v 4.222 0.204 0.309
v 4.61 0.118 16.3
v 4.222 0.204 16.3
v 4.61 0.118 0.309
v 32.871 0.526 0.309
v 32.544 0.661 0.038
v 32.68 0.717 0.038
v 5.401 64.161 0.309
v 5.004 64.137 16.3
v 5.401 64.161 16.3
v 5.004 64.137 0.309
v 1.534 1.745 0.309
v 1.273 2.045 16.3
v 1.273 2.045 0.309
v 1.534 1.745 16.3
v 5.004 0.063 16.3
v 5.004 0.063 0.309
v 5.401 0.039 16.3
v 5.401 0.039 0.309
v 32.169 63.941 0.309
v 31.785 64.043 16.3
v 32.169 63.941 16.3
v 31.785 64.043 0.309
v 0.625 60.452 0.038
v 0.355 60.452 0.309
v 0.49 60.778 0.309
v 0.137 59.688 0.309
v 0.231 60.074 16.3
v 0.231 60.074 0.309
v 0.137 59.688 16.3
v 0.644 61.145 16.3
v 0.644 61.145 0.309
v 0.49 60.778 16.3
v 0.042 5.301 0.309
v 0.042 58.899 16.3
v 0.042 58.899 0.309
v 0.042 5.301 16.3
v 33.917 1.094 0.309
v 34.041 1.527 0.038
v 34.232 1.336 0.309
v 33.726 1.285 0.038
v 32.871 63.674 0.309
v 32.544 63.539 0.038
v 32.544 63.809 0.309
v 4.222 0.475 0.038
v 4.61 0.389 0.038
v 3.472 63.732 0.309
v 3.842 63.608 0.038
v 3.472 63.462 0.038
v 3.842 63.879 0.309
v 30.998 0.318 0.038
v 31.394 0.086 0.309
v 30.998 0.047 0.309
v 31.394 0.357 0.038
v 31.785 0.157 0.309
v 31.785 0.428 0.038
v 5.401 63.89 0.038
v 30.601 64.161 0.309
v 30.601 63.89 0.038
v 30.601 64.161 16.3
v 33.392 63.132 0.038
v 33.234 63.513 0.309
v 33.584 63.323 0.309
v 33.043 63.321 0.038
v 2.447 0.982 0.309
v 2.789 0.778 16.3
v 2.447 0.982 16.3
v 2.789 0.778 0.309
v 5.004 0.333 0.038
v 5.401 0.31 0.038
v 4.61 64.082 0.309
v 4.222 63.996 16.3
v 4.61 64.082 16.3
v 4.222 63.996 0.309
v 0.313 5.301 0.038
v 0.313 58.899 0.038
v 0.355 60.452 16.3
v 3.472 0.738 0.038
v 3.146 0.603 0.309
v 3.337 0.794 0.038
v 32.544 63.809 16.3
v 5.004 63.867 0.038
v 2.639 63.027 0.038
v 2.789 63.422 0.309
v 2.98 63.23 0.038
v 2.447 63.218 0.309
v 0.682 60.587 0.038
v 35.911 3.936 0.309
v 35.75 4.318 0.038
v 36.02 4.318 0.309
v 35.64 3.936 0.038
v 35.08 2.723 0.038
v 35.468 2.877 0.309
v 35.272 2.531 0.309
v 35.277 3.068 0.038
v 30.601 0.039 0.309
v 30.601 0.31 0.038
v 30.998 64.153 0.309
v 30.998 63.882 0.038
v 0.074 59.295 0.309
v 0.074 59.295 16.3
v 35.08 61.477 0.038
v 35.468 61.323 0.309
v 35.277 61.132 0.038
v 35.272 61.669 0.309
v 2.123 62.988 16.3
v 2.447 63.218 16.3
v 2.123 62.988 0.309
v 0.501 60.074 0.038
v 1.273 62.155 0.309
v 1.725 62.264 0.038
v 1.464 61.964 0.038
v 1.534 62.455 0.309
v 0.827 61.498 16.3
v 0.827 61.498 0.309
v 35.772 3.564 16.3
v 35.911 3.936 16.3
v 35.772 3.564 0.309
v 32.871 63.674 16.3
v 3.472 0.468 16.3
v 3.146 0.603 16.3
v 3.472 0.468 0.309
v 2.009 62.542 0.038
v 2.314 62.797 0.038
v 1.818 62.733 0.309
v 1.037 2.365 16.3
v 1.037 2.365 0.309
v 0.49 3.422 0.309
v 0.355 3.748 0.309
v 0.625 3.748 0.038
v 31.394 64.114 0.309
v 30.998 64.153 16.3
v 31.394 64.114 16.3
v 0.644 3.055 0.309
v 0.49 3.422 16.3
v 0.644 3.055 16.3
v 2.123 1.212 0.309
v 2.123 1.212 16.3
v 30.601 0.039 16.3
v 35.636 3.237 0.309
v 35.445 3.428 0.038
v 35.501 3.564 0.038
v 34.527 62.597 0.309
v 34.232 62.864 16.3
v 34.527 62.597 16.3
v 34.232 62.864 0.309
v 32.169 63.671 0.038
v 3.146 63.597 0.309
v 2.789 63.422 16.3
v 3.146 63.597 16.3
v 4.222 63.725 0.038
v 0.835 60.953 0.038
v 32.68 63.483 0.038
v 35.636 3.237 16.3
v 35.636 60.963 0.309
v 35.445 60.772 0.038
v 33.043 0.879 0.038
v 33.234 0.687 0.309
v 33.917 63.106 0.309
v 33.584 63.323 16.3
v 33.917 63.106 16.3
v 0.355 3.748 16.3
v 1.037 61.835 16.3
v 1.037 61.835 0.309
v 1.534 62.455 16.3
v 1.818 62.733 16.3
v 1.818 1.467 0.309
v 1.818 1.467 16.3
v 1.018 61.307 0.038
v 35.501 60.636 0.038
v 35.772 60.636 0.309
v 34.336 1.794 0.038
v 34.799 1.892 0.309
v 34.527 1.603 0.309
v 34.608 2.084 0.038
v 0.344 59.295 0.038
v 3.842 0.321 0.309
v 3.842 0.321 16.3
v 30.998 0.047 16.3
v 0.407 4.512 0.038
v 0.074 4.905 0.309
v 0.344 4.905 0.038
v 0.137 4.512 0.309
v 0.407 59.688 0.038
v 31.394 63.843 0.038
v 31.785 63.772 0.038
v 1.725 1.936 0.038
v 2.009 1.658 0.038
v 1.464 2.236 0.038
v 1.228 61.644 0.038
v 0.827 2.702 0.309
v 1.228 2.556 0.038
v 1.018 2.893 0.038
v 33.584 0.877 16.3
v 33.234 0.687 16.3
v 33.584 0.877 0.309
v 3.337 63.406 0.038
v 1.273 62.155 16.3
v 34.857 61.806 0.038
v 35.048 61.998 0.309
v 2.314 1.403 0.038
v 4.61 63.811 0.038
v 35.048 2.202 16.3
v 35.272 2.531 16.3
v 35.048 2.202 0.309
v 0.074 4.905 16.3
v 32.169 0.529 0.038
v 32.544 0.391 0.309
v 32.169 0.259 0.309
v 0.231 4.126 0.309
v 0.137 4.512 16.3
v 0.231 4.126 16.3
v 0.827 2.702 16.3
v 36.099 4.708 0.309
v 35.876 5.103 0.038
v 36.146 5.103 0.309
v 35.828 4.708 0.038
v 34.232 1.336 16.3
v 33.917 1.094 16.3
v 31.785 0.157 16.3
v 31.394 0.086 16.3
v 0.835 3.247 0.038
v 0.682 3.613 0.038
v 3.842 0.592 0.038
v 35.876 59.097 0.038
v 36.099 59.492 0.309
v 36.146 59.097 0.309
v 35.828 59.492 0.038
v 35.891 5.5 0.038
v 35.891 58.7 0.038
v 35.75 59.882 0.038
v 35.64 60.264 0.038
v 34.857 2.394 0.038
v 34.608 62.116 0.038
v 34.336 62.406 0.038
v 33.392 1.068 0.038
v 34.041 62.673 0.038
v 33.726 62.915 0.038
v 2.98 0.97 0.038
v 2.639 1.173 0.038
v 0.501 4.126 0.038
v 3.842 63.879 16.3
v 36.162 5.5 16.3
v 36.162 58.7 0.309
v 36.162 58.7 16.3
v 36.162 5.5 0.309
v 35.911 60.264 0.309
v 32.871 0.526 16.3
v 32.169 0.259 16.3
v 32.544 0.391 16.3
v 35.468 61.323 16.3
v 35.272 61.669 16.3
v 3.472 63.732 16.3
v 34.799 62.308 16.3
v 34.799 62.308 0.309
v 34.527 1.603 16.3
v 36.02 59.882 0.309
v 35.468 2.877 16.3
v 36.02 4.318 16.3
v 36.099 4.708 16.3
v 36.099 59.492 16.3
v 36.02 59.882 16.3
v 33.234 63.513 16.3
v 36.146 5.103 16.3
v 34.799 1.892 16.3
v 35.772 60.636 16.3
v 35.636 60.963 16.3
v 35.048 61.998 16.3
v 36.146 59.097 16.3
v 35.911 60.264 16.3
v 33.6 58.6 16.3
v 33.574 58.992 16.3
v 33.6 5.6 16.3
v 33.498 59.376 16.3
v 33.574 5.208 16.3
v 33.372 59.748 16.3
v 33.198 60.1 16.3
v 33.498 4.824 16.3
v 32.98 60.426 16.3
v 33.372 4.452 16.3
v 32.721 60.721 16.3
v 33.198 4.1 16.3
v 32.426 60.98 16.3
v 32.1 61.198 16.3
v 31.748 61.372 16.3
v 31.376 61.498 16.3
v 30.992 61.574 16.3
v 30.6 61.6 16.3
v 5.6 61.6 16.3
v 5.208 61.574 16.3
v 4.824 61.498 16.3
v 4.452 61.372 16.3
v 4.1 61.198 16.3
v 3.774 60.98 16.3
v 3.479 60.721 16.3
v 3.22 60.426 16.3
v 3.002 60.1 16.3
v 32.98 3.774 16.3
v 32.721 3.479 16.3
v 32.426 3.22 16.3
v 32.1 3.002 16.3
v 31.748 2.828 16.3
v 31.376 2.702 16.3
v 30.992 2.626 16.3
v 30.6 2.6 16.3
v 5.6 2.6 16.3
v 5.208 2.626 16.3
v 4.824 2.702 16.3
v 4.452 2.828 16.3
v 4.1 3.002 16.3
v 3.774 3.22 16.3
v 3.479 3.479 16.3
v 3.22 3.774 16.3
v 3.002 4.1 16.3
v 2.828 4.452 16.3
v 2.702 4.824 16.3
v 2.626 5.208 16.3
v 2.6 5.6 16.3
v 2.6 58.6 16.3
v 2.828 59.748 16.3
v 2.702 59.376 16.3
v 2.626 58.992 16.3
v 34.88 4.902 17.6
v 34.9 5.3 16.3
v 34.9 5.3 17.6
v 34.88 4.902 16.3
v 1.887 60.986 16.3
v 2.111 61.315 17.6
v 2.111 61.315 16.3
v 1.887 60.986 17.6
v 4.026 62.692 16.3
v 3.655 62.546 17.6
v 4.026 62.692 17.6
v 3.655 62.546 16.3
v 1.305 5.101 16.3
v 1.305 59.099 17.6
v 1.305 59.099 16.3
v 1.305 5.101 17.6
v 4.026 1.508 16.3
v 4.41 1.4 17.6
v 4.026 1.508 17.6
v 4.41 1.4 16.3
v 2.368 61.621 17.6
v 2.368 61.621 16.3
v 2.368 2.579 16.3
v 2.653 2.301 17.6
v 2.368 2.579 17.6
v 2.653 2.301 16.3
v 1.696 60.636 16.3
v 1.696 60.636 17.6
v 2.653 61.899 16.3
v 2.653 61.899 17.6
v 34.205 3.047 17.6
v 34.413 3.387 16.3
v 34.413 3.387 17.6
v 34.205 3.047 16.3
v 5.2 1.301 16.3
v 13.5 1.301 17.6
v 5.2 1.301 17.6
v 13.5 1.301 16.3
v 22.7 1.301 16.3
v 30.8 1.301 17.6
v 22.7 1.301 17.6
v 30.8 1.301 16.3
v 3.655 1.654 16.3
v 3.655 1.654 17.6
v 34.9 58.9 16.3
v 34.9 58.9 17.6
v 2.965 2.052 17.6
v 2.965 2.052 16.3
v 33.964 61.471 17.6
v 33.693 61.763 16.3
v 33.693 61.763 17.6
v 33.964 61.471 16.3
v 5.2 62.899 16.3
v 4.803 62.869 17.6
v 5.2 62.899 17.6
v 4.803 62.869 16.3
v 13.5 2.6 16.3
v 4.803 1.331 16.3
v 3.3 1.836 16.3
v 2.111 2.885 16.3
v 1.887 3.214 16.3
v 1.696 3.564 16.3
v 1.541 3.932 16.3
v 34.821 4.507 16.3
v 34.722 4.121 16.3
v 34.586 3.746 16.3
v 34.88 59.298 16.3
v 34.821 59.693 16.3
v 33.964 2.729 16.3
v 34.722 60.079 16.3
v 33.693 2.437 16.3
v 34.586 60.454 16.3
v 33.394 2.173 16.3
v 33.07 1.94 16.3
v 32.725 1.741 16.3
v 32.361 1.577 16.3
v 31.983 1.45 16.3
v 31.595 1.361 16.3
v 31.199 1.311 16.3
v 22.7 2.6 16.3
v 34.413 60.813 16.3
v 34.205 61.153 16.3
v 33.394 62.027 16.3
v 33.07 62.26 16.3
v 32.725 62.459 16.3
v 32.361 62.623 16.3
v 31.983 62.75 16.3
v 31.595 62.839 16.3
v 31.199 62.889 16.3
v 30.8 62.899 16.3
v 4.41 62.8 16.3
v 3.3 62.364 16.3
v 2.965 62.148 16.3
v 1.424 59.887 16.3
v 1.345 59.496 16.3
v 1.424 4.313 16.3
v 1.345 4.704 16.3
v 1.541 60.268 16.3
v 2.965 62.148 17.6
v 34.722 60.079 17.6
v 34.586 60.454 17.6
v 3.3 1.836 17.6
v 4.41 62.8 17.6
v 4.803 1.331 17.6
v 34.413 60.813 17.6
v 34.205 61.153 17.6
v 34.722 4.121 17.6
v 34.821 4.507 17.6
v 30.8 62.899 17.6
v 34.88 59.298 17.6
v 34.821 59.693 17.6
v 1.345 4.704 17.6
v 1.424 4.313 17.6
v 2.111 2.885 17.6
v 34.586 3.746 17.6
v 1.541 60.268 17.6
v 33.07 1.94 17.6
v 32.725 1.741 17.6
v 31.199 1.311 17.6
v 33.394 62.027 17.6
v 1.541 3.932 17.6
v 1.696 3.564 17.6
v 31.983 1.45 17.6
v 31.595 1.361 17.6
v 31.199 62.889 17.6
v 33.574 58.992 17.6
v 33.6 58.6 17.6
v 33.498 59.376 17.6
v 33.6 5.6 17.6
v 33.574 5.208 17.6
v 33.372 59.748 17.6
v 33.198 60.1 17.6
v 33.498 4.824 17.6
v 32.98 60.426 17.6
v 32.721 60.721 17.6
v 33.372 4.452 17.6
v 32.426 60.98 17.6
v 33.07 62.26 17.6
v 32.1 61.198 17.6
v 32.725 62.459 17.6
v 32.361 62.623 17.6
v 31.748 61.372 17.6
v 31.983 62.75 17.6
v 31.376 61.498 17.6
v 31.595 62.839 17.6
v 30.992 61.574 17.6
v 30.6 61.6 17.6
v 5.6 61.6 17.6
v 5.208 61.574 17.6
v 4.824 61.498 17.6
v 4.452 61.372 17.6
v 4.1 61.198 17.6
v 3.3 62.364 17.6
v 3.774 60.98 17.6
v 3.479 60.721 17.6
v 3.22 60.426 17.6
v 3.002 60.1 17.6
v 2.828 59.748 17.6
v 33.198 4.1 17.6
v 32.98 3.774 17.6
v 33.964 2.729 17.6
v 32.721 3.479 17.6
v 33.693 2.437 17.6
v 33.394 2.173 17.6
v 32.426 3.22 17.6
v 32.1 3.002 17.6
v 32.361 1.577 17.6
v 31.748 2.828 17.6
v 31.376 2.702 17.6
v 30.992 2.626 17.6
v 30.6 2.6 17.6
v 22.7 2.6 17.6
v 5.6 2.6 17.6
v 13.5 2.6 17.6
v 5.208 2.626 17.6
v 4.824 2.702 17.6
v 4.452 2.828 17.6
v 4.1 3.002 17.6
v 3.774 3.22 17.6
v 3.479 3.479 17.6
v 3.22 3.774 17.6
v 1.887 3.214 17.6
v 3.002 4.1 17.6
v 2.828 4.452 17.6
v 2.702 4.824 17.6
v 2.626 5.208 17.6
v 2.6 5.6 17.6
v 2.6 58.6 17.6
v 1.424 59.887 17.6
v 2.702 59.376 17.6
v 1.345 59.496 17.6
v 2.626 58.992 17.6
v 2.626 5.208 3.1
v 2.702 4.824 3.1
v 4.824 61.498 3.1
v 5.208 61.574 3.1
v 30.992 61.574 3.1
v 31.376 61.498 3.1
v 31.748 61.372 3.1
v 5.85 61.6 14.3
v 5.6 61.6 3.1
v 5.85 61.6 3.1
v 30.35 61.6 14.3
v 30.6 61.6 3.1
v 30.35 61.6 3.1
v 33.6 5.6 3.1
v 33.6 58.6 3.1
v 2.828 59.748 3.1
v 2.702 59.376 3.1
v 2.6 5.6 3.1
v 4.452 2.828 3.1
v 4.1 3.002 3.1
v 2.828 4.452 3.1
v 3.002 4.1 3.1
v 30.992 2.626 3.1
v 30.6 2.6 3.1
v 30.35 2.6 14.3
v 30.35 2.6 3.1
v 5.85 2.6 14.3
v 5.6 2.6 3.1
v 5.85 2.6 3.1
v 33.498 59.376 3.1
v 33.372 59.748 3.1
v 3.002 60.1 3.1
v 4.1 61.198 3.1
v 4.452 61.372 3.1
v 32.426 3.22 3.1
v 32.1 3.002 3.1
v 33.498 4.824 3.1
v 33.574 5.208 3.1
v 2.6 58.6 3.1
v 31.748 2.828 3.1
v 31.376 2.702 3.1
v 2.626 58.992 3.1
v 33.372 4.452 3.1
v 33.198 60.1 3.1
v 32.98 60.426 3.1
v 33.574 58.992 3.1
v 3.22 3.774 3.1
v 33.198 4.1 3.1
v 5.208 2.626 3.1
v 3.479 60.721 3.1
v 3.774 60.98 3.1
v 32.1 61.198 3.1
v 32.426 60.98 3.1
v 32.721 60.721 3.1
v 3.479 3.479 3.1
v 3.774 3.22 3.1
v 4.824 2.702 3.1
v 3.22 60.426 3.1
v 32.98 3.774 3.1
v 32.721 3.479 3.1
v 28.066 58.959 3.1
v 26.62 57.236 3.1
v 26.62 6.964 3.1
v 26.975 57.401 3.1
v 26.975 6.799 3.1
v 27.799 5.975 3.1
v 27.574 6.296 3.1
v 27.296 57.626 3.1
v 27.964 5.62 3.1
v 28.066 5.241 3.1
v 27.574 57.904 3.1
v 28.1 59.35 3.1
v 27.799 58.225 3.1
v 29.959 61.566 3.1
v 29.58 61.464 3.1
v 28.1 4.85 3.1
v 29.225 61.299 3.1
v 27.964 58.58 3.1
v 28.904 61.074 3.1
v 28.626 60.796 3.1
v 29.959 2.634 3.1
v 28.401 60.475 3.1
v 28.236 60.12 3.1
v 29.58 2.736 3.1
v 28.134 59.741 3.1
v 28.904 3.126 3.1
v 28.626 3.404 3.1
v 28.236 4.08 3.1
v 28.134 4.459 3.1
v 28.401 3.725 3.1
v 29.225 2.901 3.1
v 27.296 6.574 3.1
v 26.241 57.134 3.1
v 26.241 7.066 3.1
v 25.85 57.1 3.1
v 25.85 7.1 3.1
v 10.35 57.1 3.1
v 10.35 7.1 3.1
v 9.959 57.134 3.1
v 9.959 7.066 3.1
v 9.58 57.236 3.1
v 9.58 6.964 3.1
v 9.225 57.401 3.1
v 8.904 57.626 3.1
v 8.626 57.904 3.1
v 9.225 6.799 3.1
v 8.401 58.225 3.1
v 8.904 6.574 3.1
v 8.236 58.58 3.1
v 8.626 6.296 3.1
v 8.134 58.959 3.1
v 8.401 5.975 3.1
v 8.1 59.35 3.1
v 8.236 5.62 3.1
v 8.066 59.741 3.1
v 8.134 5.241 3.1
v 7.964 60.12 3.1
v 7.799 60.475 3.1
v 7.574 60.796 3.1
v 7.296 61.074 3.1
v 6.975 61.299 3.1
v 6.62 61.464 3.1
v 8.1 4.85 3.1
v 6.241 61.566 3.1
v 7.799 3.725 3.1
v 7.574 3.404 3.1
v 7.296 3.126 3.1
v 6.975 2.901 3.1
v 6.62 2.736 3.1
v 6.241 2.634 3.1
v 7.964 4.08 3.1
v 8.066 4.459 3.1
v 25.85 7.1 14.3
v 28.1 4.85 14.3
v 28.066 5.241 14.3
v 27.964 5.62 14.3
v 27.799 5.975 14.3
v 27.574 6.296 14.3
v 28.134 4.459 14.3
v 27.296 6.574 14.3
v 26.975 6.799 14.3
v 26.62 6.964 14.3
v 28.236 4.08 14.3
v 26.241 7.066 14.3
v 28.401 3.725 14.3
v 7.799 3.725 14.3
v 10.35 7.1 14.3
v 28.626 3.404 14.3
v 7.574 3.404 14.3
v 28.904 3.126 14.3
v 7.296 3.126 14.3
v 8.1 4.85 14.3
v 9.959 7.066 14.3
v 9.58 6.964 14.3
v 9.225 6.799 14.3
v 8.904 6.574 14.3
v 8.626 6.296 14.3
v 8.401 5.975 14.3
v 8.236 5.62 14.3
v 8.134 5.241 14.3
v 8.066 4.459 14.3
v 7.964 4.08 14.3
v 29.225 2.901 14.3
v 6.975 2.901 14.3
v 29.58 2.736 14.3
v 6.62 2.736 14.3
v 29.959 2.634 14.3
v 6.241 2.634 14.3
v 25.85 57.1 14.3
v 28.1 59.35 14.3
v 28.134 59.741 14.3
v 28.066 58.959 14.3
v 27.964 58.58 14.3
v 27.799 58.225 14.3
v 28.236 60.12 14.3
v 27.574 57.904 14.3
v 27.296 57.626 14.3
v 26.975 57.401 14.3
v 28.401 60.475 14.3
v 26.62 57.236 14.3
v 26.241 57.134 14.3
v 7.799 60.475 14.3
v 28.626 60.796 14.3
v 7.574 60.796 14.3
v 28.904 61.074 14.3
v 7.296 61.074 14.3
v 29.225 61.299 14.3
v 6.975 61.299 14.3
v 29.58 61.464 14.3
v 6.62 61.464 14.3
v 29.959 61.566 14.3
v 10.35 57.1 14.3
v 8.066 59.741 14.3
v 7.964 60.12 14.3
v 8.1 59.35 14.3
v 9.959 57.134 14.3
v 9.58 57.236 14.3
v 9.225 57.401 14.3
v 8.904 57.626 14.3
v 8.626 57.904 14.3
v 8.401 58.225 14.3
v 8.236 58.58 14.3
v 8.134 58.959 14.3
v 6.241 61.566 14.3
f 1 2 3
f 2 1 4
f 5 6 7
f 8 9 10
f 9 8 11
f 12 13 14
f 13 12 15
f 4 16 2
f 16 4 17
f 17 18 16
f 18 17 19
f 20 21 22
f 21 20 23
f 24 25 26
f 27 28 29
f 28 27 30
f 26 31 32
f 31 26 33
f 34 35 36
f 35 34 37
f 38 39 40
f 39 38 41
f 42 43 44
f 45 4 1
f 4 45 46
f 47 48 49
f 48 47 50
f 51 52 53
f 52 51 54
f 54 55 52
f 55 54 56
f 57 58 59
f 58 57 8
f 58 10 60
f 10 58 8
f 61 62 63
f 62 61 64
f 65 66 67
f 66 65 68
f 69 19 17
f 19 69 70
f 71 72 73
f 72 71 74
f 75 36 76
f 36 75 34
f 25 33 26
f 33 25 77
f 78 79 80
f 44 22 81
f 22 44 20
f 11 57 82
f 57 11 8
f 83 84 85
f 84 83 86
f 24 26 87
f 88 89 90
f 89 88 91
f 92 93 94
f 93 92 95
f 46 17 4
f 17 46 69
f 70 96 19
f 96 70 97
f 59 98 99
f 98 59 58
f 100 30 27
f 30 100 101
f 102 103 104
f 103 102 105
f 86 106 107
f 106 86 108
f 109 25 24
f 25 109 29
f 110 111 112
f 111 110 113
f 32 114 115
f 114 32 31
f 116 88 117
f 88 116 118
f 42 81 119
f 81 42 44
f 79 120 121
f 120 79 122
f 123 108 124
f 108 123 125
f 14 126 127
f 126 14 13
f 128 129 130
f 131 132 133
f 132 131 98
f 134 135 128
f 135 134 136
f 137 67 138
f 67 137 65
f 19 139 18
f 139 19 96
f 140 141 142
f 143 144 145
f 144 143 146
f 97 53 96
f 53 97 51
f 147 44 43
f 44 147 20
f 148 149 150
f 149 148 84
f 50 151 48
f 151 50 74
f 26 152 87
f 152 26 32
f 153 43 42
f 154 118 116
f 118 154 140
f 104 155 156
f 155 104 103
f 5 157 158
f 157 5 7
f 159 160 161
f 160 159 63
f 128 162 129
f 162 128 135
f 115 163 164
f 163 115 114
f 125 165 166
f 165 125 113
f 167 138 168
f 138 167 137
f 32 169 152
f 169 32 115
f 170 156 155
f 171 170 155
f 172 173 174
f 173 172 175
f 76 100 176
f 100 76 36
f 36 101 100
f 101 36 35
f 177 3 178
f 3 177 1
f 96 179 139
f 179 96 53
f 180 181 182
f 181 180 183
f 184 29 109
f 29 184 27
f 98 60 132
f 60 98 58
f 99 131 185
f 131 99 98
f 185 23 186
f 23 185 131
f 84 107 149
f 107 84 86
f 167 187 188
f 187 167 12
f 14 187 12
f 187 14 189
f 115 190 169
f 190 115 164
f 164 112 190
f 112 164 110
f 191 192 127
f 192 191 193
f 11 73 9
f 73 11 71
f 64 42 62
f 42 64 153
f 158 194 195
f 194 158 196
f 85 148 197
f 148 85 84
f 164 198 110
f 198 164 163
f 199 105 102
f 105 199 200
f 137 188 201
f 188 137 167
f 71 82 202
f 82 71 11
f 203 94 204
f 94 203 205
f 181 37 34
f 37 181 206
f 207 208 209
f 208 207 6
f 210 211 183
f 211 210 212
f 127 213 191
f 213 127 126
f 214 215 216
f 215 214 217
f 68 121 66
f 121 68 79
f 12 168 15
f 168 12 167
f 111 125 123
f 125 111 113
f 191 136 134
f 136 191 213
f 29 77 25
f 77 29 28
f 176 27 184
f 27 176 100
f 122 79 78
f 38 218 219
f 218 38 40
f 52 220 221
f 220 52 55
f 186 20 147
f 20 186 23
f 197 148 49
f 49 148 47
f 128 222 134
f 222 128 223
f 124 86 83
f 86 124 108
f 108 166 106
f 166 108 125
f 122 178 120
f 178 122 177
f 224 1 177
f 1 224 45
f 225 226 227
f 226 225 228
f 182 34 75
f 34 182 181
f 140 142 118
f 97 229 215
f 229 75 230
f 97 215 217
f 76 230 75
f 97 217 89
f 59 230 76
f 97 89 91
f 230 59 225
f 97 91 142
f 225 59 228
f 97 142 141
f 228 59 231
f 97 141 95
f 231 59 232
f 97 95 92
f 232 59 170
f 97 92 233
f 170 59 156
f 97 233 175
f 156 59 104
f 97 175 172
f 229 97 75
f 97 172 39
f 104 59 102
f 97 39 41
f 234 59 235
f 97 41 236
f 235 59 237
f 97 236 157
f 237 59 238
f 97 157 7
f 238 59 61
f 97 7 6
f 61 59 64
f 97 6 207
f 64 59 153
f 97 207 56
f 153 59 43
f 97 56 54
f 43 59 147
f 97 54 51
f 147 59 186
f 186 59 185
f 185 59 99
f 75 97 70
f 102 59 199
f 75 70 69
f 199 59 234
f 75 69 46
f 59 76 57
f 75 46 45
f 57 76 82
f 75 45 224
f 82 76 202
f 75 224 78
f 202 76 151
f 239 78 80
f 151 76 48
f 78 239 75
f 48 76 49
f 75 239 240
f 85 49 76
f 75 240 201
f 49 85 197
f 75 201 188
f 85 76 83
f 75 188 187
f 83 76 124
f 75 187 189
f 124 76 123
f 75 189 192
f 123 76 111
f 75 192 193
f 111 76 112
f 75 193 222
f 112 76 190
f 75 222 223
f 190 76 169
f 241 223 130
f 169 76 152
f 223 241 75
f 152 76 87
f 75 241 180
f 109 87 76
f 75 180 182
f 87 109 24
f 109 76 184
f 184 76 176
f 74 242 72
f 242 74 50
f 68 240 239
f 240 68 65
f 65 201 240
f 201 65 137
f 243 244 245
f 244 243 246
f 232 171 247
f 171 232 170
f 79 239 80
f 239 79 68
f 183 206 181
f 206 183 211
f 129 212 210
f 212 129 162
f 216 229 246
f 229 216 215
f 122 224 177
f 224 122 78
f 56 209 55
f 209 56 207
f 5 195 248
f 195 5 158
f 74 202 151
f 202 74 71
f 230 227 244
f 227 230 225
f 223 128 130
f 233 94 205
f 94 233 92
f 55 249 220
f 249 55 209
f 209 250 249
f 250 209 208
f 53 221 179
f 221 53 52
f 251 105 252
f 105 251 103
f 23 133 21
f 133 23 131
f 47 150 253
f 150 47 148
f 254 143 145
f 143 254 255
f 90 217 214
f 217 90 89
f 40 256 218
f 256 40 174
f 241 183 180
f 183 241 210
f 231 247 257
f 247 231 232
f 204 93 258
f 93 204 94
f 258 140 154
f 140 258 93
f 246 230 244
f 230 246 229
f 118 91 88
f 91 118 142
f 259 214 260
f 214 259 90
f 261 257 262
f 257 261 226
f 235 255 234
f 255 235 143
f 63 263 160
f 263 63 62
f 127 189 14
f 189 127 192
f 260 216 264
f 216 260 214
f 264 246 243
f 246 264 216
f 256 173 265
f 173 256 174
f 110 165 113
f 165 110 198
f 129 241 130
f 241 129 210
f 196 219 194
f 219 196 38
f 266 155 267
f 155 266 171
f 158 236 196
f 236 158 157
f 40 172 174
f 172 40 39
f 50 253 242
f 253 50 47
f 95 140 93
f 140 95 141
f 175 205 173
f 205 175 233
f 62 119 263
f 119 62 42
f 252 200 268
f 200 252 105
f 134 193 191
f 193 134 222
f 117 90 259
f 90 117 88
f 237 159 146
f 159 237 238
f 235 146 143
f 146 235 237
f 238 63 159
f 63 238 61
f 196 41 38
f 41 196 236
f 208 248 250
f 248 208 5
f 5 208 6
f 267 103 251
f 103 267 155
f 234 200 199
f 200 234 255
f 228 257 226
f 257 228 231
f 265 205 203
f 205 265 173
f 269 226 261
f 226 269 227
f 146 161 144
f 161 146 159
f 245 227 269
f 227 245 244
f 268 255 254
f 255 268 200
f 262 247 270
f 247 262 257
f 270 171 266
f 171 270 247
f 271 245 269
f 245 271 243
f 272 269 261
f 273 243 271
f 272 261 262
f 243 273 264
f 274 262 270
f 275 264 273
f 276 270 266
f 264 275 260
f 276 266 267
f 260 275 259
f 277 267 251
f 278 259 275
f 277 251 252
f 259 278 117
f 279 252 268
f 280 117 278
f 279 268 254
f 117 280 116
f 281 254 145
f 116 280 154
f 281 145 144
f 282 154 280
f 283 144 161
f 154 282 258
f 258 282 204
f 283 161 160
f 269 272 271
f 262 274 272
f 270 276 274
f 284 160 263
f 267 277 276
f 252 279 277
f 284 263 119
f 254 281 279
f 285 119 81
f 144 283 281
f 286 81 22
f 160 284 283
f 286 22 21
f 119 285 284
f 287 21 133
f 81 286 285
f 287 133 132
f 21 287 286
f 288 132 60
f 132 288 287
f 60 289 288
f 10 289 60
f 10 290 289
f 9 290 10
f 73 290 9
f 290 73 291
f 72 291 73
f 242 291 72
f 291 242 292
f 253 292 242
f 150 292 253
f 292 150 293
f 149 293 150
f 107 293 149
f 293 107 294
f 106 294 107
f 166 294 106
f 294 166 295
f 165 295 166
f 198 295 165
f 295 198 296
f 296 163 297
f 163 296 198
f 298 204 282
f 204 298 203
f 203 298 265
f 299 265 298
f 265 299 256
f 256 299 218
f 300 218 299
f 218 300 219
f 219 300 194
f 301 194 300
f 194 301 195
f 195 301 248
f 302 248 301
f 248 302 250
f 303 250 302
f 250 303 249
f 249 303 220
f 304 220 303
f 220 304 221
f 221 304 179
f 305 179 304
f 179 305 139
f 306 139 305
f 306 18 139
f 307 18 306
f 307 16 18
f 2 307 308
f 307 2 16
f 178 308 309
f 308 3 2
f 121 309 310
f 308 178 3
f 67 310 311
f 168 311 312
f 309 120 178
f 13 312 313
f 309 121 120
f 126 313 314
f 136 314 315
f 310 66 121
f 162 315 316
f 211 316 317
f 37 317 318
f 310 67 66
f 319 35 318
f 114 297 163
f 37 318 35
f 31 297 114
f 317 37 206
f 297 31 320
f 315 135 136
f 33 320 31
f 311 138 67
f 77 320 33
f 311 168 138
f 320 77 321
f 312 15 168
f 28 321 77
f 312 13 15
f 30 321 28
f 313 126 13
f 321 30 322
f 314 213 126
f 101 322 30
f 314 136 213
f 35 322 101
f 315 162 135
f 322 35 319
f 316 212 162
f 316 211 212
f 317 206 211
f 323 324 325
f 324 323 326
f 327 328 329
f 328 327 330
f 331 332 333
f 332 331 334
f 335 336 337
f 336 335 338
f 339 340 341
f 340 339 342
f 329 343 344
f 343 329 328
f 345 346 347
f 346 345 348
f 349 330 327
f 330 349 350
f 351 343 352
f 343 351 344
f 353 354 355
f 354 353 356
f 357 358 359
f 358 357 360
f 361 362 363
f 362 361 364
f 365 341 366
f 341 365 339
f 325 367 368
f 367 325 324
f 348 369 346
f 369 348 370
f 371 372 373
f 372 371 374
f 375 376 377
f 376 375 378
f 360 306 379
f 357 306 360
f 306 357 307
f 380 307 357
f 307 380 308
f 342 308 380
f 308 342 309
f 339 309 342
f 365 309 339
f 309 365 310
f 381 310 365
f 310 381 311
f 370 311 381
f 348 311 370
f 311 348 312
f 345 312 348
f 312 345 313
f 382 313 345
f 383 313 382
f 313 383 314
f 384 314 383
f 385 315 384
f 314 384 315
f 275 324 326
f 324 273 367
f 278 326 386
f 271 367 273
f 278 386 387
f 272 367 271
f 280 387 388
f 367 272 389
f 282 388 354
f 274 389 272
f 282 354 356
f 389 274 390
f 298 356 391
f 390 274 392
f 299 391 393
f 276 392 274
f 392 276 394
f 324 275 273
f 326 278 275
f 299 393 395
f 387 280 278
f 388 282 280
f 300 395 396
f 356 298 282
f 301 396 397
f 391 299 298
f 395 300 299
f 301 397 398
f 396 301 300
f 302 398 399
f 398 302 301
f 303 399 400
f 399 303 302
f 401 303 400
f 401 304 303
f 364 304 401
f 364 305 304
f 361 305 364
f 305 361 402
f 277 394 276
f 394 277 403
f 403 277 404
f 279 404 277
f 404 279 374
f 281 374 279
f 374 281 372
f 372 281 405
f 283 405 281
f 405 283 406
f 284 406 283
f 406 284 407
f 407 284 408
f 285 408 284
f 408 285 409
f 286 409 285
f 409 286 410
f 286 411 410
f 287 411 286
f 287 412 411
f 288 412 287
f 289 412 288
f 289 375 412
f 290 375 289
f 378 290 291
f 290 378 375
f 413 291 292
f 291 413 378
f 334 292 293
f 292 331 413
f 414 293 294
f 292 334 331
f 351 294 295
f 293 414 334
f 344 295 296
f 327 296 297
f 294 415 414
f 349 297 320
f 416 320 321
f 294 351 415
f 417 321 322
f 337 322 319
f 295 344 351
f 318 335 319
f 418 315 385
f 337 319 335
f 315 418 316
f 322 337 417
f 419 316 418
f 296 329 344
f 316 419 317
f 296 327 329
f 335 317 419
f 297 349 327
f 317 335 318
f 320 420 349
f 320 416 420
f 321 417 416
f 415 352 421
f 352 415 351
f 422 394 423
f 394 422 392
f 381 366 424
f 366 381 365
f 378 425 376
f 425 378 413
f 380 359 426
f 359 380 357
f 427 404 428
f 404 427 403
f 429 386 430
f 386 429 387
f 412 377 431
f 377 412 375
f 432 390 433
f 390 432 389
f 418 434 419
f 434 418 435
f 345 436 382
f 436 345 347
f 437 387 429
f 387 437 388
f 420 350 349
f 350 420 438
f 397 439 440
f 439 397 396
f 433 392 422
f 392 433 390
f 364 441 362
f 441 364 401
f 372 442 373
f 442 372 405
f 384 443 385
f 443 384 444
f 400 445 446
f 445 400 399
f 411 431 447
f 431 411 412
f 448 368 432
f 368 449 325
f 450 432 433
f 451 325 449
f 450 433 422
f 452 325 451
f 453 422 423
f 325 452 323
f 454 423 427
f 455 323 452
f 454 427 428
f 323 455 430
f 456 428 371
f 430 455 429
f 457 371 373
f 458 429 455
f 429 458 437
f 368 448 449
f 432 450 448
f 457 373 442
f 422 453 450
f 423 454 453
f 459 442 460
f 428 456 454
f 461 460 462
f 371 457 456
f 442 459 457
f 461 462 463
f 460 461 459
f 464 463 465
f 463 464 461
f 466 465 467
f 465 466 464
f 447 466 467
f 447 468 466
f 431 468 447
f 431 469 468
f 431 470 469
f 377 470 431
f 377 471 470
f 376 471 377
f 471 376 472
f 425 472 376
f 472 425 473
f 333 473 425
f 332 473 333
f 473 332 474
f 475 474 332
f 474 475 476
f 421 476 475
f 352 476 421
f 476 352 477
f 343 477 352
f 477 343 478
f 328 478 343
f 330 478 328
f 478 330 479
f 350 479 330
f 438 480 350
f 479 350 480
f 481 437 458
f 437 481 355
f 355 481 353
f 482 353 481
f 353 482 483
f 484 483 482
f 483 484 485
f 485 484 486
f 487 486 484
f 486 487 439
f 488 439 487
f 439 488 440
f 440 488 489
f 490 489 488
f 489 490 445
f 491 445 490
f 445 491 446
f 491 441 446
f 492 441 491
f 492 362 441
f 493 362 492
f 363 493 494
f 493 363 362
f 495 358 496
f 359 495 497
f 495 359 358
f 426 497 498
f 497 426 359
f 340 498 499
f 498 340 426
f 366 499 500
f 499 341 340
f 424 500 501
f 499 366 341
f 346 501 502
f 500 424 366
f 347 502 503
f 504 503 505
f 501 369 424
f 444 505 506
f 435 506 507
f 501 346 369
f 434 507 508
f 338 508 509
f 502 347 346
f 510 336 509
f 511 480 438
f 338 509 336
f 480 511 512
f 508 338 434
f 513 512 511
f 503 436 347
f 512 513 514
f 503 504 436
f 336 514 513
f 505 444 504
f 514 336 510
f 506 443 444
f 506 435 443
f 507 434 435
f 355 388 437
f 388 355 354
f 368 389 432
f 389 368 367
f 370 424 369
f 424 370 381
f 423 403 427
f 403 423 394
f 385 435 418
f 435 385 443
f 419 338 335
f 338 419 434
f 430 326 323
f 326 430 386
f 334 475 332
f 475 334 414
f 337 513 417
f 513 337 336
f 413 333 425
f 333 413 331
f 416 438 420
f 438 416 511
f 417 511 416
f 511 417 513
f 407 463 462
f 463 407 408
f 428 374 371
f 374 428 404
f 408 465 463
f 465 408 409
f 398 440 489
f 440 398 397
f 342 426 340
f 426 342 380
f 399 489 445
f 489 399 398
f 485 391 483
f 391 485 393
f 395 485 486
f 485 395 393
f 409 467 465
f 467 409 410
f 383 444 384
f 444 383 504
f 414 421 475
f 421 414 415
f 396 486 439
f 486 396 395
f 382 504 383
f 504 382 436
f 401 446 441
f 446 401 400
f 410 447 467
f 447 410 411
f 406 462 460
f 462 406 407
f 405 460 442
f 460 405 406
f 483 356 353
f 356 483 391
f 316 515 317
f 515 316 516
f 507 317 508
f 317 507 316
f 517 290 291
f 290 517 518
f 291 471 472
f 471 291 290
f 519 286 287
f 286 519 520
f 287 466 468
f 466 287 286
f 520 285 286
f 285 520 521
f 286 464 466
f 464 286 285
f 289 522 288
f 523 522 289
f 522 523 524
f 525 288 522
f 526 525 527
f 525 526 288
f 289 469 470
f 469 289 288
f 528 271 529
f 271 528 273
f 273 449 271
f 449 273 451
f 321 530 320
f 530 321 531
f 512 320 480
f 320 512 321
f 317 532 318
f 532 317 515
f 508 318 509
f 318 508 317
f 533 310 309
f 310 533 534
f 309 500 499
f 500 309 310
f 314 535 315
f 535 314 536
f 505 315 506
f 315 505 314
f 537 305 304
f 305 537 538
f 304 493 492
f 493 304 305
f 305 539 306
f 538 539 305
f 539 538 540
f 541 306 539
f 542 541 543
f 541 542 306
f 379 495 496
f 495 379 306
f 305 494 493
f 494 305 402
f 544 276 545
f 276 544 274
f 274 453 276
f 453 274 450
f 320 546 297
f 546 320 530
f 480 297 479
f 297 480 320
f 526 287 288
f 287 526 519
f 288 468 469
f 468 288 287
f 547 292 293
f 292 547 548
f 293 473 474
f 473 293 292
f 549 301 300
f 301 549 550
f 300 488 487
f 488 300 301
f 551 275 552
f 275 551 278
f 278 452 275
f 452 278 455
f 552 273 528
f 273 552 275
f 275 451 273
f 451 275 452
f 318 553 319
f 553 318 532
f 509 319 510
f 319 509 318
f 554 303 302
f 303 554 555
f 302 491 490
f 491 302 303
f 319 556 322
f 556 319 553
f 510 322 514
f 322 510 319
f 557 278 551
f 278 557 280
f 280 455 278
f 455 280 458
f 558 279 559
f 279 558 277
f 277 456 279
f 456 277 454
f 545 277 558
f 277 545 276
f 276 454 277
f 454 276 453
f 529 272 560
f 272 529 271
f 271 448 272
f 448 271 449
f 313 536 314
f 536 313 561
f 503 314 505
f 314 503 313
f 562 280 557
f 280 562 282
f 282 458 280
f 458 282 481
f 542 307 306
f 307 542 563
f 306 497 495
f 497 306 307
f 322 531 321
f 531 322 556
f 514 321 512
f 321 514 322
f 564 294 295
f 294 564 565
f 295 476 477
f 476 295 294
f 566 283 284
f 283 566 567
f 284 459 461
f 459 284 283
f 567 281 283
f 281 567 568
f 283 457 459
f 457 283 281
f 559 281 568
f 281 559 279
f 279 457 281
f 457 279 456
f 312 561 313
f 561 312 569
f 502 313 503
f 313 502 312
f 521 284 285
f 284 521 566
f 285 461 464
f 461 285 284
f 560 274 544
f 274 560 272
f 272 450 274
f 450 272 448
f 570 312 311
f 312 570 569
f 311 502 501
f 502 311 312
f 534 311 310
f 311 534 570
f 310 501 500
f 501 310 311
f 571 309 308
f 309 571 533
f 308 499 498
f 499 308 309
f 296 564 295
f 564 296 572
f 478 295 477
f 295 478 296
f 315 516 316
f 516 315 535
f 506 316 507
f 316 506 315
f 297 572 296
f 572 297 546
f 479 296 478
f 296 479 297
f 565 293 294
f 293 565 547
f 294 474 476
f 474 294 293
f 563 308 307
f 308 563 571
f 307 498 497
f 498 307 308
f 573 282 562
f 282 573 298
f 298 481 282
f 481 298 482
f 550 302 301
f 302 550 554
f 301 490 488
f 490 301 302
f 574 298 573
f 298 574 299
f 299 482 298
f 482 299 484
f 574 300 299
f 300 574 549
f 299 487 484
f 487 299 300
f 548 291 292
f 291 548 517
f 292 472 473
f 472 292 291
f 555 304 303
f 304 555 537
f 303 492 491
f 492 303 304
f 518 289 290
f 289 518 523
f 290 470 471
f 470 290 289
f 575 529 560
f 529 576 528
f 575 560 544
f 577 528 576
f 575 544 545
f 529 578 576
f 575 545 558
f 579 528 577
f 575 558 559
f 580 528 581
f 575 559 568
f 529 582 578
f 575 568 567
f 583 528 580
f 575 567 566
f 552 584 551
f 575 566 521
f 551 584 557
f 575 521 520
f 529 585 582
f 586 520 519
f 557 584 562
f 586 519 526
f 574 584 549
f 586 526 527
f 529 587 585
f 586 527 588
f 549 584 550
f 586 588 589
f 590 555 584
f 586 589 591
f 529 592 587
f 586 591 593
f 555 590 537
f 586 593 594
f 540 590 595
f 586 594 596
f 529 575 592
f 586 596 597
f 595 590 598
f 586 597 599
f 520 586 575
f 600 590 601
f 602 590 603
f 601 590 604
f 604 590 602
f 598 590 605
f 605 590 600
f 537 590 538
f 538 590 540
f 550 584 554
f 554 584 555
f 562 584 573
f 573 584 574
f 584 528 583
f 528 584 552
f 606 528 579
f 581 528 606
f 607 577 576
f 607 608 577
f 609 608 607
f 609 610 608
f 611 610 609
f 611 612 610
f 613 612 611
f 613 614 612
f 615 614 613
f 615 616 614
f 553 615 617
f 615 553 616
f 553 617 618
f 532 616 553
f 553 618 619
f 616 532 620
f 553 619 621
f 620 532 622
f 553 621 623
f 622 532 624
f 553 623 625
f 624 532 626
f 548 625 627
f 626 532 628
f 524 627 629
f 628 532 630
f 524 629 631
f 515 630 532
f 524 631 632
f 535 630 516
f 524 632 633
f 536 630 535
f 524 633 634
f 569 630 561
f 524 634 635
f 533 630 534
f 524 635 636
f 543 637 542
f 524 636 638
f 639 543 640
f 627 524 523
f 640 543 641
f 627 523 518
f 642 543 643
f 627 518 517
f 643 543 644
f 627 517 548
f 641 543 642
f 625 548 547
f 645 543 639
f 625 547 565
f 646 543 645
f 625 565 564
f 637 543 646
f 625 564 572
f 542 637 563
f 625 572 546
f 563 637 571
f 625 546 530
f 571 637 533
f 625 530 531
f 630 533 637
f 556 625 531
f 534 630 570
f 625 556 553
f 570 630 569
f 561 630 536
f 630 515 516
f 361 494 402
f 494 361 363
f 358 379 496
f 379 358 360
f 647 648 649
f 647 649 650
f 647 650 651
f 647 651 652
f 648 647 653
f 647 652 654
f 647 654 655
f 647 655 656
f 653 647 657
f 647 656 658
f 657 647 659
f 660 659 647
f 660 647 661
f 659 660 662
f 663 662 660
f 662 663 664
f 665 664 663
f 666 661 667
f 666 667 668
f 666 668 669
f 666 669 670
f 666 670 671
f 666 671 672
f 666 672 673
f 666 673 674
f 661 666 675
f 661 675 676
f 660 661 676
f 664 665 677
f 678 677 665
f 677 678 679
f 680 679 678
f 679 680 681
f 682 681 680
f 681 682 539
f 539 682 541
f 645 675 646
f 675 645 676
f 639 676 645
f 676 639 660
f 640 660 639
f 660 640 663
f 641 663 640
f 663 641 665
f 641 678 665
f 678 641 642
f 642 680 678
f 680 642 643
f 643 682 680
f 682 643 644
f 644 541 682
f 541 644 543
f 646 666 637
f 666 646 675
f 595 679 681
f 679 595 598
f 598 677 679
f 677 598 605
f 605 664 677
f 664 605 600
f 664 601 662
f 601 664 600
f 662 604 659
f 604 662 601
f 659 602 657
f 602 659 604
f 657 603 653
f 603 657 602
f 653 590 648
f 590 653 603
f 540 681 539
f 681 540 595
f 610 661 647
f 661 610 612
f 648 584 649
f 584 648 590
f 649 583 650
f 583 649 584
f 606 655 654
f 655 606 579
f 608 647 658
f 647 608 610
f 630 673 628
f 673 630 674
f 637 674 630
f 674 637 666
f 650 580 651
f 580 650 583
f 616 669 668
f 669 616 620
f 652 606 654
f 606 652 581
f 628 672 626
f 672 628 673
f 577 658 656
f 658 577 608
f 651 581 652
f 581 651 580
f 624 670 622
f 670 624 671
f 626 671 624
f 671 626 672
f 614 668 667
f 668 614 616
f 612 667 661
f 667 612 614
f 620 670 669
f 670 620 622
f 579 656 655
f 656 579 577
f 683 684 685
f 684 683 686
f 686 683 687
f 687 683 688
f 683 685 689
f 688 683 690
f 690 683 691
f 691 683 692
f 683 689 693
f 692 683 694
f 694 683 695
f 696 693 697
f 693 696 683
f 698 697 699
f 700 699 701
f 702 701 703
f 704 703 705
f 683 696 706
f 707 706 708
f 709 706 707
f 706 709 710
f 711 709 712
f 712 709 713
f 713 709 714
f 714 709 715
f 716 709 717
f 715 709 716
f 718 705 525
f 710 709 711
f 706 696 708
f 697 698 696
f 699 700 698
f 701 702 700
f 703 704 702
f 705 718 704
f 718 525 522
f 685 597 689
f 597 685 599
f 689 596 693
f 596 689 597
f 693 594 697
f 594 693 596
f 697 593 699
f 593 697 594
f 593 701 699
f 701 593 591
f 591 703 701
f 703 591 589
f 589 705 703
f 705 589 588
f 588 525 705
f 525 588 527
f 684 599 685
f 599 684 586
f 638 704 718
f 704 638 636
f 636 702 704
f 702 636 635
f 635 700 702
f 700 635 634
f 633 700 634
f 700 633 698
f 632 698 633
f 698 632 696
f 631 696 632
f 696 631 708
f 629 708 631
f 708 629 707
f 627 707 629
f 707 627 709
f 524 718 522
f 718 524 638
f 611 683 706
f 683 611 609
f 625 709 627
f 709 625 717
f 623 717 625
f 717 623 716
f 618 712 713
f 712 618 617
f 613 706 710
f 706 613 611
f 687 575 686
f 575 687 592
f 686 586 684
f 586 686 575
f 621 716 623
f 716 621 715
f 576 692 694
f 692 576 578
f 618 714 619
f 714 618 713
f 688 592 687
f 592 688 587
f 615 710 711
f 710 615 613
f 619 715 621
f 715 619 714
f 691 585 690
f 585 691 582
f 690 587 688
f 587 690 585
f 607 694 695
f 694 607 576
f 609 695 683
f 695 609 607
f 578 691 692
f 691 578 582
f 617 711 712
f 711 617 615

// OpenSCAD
use <MCAD/boxes.scad>
$fa=1;
$fs=0.4;


inner_width = 31;
inner_length = 59;
inner_height = 13.2;
pcb_height = 11.2;

battery_length = 50;

wall_thickness = 2.6;

outer_width = inner_width + wall_thickness * 2;
outer_length = inner_length + wall_thickness * 2;
outer_height = inner_height + wall_thickness;


bevel_radius = 0.5;

lip_thickness = 1.3;

support_width = 20;
support_radius = 4.5;


module box(width, length, height, radius, bevel_radius=0) {
    difference() {
        minkowski() {
            sphere(bevel_radius);
            hull() {
                translate([radius + bevel_radius, radius + bevel_radius, bevel_radius]) cylinder(height, radius, radius);
                translate([width - radius - bevel_radius, radius + bevel_radius, bevel_radius]) cylinder(height, radius, radius);
                translate([width - radius - bevel_radius, length - radius - bevel_radius, bevel_radius]) cylinder(height, radius, radius);
                translate([radius + bevel_radius, length - radius - bevel_radius, bevel_radius]) cylinder(height, radius, radius);
            }
        }
        translate([0, 0, height + bevel_radius]) cube([width, length, bevel_radius]);
    }
}

module box_with_lip(inner_width, inner_length, inner_height, radius, wall_thickness, bevel_radius) {
    
    outer_width = inner_width + wall_thickness * 2;
    outer_length = inner_length + wall_thickness * 2;
    outer_height = inner_height + wall_thickness;
    
    difference() {
        // outer box
        union() {
            box(outer_width, outer_length, outer_height, 5, bevel_radius);
            // lip
            translate([wall_thickness - lip_thickness, wall_thickness - lip_thickness, outer_height + bevel_radius])
            box(inner_width + lip_thickness * 2, inner_length + lip_thickness * 2, lip_thickness, 4, 0);
        }
        
        // inner cutout
        translate([wall_thickness, wall_thickness, wall_thickness + bevel_radius])
        box(inner_width, inner_length, outer_height + 0.1, 3, 0);
    }
}

module usb_hole(xpos, ypos, zpos) {
    usb_hole_width = 9.2;
    translate([xpos - usb_hole_width / 2, ypos, zpos])
    cube([usb_hole_width, 5, 5]);
}

difference () {
    box_with_lip(inner_width, inner_length, inner_height, 5, wall_thickness, bevel_radius);
    usb_hole(outer_width / 2, 0, inner_height + wall_thickness + bevel_radius);
}

module fillet(radius, height) {
    linear_extrude(height=height)
    difference() {
        square([radius, radius]);
        translate([radius, radius])
        circle(radius);
    }
}

module support(radius, width, height) {
    r2 = radius / 2;
    rotate([0, 0, 90])
    fillet(r2, height);
    translate([width, 0])
    fillet(r2, height);
    
    hull() {
        translate([r2, r2])
        cylinder(height, r2, r2);
        translate([width-r2, r2])
        cylinder(height, r2, r2);
        cube([width, r2, height]);
    }
}

translate([outer_width / 2 - support_width / 2, wall_thickness, wall_thickness + bevel_radius])
support(support_radius, 20, pcb_height);

translate([outer_width / 2 + support_width / 2, wall_thickness + inner_length, wall_thickness + bevel_radius])
rotate([0, 0, 180])
support(support_radius, 20, pcb_height);
